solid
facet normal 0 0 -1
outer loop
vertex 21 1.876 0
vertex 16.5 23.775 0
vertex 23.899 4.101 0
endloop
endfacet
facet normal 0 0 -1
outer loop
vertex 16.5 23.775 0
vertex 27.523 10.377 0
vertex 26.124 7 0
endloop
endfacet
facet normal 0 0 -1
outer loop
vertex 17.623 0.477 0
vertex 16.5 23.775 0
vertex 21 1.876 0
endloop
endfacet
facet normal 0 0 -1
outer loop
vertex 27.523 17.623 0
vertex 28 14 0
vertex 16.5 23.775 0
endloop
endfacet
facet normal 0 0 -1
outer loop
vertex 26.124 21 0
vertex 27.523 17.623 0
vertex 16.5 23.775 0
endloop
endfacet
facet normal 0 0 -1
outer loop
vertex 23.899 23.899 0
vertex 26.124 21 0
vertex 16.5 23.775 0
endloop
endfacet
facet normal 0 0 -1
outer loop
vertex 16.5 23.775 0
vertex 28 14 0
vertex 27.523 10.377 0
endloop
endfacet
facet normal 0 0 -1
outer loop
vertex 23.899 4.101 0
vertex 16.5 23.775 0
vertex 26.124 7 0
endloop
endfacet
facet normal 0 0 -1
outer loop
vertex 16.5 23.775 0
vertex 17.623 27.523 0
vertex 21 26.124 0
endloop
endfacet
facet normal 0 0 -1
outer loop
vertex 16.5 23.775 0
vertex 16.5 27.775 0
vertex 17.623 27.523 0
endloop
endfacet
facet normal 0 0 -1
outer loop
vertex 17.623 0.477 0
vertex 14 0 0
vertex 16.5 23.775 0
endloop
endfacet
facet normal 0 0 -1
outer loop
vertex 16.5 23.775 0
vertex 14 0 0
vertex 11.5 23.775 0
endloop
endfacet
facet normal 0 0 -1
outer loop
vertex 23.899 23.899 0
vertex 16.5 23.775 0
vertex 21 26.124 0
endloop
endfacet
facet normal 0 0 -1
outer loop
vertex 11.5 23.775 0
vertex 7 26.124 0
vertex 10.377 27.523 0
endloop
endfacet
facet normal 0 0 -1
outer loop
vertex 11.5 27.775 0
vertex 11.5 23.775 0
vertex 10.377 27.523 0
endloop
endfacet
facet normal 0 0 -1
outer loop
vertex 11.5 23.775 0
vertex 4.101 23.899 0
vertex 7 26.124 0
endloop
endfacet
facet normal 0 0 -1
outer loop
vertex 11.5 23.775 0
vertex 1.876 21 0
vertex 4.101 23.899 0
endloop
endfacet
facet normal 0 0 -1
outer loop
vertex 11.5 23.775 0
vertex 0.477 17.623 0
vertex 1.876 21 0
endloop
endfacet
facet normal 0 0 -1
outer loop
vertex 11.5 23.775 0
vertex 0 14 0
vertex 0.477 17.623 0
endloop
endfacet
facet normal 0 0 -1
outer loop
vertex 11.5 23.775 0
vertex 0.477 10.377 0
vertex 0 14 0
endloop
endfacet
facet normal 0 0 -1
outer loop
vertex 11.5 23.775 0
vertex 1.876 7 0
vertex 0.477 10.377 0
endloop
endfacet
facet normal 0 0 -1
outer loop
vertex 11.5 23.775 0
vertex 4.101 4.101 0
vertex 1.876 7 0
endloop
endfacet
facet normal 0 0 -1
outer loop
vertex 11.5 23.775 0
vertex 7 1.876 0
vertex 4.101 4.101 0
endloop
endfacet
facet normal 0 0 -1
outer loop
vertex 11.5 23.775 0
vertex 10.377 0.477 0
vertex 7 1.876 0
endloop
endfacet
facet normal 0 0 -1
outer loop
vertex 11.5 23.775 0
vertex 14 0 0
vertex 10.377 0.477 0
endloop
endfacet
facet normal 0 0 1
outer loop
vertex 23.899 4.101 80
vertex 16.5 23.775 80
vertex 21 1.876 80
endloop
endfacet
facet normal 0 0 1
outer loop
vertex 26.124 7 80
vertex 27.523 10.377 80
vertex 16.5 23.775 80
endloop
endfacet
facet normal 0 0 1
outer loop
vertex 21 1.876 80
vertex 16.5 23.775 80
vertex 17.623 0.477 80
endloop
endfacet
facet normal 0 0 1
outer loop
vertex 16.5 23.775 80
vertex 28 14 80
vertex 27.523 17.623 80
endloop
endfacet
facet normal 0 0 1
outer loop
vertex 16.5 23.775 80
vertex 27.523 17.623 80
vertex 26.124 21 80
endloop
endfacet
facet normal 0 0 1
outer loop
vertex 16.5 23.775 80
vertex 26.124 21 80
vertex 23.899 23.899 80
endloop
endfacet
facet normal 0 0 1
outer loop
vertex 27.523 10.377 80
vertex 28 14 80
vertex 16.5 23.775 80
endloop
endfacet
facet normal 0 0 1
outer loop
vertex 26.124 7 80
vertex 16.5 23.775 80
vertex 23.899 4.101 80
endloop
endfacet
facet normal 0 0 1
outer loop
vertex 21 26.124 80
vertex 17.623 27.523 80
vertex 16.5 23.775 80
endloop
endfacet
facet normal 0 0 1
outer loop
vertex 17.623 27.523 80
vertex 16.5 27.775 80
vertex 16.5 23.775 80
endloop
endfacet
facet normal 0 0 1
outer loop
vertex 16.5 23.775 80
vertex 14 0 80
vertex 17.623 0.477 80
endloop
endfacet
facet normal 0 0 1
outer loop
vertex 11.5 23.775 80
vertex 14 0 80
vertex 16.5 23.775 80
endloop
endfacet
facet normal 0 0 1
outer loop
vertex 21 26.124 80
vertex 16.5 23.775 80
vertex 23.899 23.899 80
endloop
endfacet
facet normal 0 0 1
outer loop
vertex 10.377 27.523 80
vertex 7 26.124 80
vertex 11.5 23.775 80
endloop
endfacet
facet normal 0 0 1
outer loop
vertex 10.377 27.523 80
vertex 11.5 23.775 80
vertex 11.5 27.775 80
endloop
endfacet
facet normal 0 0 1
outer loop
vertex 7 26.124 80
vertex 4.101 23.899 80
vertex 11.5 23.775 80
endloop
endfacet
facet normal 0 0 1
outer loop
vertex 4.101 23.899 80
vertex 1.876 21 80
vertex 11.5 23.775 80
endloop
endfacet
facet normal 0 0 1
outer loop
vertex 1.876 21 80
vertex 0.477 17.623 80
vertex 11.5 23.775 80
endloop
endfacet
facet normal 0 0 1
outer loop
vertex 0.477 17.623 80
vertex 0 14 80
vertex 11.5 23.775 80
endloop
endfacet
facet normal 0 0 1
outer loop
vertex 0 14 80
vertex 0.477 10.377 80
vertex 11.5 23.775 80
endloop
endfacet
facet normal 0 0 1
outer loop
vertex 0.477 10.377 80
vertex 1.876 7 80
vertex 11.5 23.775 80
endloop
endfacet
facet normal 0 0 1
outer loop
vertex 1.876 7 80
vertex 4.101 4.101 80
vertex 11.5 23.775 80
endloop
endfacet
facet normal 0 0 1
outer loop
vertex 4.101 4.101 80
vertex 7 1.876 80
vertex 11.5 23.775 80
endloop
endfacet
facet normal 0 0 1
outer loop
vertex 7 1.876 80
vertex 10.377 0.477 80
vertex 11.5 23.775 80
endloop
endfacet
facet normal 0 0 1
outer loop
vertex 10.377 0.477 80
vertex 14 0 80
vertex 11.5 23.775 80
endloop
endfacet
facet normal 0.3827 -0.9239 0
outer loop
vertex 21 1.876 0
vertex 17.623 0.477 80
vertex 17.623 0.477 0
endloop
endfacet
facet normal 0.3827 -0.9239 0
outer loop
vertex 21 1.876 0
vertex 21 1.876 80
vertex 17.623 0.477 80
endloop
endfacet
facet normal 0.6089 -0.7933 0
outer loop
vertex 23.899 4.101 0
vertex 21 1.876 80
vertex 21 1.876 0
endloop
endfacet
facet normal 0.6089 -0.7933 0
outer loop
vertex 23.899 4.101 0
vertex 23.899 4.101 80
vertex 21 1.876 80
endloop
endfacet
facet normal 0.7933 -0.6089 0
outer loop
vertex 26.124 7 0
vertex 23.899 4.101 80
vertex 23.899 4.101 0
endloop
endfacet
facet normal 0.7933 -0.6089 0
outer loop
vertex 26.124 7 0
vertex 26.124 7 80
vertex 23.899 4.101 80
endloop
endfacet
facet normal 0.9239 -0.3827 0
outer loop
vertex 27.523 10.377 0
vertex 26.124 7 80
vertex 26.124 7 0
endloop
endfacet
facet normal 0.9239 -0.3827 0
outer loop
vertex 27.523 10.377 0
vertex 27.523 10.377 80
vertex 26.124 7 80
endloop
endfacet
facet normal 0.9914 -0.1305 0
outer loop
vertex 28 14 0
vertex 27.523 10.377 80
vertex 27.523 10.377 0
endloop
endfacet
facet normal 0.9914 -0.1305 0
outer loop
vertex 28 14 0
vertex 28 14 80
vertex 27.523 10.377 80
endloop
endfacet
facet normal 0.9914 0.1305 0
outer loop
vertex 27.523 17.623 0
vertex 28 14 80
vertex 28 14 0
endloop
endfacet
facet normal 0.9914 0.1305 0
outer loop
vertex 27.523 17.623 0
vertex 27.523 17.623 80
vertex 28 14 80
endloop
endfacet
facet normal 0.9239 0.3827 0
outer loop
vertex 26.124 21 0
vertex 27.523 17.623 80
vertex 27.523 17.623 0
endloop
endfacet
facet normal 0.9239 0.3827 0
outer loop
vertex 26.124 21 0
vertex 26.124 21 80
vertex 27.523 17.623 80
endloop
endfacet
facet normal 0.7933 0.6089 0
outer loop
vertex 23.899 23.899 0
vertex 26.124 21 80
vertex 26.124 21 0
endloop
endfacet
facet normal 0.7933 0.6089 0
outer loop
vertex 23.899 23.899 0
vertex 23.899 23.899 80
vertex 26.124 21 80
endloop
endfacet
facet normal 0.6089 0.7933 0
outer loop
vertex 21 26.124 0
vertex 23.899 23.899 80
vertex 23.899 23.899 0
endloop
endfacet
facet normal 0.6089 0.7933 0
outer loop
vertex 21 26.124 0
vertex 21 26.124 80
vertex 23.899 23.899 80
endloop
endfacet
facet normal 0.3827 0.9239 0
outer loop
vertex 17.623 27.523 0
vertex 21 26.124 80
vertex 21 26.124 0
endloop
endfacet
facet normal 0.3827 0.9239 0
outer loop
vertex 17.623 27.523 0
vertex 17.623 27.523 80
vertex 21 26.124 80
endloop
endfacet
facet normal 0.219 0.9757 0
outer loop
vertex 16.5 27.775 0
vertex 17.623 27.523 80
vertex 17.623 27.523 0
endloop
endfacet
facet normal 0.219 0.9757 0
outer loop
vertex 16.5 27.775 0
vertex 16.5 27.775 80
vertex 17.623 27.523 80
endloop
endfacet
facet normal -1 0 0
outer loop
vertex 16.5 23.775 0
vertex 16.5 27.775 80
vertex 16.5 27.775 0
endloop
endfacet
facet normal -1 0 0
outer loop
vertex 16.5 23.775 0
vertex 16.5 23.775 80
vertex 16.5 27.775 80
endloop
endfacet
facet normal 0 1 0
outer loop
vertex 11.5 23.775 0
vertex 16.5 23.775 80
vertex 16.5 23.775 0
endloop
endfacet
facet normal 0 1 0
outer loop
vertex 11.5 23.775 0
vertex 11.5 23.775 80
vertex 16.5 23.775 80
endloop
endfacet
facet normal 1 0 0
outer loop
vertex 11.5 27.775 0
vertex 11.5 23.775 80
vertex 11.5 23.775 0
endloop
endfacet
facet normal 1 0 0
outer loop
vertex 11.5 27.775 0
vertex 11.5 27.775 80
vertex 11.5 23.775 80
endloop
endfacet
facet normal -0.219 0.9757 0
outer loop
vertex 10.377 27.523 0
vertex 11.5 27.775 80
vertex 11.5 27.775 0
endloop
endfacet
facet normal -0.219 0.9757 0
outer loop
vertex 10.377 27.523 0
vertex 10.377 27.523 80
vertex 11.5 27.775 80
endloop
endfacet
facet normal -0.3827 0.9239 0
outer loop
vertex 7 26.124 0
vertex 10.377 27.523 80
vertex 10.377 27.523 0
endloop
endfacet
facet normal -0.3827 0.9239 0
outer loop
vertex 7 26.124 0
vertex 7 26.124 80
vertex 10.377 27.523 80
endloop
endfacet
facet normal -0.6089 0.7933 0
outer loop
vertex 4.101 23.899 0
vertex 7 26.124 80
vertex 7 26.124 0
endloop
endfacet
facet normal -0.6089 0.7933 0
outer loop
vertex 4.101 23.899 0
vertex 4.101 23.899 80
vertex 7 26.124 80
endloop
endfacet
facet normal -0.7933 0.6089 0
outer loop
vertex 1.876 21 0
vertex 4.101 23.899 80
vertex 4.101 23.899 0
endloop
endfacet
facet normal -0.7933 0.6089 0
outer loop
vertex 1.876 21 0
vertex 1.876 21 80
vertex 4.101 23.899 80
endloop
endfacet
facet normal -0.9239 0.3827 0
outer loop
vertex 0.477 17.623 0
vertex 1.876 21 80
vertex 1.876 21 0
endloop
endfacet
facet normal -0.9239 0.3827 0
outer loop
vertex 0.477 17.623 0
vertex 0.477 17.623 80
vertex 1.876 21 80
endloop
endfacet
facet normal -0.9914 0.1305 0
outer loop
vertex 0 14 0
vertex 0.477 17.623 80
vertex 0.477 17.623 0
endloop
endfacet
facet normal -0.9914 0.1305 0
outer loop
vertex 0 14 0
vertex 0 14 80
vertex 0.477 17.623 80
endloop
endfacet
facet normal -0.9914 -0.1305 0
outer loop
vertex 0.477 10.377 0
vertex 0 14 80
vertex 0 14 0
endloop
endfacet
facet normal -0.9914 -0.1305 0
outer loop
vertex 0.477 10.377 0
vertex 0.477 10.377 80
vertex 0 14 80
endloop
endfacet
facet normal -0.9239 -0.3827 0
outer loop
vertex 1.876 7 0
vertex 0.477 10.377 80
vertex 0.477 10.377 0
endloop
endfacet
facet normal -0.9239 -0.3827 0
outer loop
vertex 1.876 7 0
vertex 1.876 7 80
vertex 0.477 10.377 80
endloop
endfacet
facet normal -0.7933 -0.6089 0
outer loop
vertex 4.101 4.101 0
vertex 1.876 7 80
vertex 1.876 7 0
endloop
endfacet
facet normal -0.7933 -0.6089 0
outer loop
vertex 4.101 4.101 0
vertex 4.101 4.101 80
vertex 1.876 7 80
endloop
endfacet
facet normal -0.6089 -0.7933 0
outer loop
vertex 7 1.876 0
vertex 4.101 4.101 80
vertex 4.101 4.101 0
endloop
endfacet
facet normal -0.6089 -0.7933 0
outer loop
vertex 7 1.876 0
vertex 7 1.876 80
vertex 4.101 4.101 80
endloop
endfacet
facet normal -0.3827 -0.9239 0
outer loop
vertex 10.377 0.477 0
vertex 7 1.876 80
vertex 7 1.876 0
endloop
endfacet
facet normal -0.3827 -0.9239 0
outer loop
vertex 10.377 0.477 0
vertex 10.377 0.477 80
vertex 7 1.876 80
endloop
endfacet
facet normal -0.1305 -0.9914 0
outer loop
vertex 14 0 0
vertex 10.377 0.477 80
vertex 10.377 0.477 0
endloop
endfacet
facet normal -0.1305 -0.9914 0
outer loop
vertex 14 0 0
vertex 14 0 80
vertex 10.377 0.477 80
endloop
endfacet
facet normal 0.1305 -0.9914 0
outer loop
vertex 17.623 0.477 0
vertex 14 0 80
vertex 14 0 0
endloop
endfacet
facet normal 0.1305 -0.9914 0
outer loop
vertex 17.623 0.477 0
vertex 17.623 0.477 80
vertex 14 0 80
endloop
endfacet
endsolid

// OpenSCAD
$fn = 32;

// ----------------------------------------------------------------------
// Keyway shaft: d28 shaft, key 5 x 4 mm
// ----------------------------------------------------------------------

// --- parameters (mm) ---
shaft_r = 14;             // shaft radius
key_w = 5;                // keyway width
key_d = 4;                // keyway depth below the surface line
plate_t = 80;             // shaft length, Z (extrusion height)
fit_tol = 0.02;           // declared fit tolerance (prompt contract)
free_tol = 0.2;           // declared free tolerance (prompt contract)

shaft_d = 2 * shaft_r;  // shaft diameter
circle_step = 15;  // polygon sampling step, degrees

profile = [[10.377, 27.523], [7, 26.124], [4.101, 23.899], [1.876, 21], [0.477, 17.623], [0, 14], [0.477, 10.377], [1.876, 7], [4.101, 4.101], [7, 1.876], [10.377, 0.477], [14, 0], [17.623, 0.477], [21, 1.876], [23.899, 4.101], [26.124, 7], [27.523, 10.377], [28, 14], [27.523, 17.623], [26.124, 21], [23.899, 23.899], [21, 26.124], [17.623, 27.523], [16.5, 27.775], [16.5, 23.775], [11.5, 23.775], [11.5, 27.775]];  // primary outline, 27 points, counter clockwise

// --- the one profile operation ---
linear_extrude(height = plate_t) polygon(points = profile);
